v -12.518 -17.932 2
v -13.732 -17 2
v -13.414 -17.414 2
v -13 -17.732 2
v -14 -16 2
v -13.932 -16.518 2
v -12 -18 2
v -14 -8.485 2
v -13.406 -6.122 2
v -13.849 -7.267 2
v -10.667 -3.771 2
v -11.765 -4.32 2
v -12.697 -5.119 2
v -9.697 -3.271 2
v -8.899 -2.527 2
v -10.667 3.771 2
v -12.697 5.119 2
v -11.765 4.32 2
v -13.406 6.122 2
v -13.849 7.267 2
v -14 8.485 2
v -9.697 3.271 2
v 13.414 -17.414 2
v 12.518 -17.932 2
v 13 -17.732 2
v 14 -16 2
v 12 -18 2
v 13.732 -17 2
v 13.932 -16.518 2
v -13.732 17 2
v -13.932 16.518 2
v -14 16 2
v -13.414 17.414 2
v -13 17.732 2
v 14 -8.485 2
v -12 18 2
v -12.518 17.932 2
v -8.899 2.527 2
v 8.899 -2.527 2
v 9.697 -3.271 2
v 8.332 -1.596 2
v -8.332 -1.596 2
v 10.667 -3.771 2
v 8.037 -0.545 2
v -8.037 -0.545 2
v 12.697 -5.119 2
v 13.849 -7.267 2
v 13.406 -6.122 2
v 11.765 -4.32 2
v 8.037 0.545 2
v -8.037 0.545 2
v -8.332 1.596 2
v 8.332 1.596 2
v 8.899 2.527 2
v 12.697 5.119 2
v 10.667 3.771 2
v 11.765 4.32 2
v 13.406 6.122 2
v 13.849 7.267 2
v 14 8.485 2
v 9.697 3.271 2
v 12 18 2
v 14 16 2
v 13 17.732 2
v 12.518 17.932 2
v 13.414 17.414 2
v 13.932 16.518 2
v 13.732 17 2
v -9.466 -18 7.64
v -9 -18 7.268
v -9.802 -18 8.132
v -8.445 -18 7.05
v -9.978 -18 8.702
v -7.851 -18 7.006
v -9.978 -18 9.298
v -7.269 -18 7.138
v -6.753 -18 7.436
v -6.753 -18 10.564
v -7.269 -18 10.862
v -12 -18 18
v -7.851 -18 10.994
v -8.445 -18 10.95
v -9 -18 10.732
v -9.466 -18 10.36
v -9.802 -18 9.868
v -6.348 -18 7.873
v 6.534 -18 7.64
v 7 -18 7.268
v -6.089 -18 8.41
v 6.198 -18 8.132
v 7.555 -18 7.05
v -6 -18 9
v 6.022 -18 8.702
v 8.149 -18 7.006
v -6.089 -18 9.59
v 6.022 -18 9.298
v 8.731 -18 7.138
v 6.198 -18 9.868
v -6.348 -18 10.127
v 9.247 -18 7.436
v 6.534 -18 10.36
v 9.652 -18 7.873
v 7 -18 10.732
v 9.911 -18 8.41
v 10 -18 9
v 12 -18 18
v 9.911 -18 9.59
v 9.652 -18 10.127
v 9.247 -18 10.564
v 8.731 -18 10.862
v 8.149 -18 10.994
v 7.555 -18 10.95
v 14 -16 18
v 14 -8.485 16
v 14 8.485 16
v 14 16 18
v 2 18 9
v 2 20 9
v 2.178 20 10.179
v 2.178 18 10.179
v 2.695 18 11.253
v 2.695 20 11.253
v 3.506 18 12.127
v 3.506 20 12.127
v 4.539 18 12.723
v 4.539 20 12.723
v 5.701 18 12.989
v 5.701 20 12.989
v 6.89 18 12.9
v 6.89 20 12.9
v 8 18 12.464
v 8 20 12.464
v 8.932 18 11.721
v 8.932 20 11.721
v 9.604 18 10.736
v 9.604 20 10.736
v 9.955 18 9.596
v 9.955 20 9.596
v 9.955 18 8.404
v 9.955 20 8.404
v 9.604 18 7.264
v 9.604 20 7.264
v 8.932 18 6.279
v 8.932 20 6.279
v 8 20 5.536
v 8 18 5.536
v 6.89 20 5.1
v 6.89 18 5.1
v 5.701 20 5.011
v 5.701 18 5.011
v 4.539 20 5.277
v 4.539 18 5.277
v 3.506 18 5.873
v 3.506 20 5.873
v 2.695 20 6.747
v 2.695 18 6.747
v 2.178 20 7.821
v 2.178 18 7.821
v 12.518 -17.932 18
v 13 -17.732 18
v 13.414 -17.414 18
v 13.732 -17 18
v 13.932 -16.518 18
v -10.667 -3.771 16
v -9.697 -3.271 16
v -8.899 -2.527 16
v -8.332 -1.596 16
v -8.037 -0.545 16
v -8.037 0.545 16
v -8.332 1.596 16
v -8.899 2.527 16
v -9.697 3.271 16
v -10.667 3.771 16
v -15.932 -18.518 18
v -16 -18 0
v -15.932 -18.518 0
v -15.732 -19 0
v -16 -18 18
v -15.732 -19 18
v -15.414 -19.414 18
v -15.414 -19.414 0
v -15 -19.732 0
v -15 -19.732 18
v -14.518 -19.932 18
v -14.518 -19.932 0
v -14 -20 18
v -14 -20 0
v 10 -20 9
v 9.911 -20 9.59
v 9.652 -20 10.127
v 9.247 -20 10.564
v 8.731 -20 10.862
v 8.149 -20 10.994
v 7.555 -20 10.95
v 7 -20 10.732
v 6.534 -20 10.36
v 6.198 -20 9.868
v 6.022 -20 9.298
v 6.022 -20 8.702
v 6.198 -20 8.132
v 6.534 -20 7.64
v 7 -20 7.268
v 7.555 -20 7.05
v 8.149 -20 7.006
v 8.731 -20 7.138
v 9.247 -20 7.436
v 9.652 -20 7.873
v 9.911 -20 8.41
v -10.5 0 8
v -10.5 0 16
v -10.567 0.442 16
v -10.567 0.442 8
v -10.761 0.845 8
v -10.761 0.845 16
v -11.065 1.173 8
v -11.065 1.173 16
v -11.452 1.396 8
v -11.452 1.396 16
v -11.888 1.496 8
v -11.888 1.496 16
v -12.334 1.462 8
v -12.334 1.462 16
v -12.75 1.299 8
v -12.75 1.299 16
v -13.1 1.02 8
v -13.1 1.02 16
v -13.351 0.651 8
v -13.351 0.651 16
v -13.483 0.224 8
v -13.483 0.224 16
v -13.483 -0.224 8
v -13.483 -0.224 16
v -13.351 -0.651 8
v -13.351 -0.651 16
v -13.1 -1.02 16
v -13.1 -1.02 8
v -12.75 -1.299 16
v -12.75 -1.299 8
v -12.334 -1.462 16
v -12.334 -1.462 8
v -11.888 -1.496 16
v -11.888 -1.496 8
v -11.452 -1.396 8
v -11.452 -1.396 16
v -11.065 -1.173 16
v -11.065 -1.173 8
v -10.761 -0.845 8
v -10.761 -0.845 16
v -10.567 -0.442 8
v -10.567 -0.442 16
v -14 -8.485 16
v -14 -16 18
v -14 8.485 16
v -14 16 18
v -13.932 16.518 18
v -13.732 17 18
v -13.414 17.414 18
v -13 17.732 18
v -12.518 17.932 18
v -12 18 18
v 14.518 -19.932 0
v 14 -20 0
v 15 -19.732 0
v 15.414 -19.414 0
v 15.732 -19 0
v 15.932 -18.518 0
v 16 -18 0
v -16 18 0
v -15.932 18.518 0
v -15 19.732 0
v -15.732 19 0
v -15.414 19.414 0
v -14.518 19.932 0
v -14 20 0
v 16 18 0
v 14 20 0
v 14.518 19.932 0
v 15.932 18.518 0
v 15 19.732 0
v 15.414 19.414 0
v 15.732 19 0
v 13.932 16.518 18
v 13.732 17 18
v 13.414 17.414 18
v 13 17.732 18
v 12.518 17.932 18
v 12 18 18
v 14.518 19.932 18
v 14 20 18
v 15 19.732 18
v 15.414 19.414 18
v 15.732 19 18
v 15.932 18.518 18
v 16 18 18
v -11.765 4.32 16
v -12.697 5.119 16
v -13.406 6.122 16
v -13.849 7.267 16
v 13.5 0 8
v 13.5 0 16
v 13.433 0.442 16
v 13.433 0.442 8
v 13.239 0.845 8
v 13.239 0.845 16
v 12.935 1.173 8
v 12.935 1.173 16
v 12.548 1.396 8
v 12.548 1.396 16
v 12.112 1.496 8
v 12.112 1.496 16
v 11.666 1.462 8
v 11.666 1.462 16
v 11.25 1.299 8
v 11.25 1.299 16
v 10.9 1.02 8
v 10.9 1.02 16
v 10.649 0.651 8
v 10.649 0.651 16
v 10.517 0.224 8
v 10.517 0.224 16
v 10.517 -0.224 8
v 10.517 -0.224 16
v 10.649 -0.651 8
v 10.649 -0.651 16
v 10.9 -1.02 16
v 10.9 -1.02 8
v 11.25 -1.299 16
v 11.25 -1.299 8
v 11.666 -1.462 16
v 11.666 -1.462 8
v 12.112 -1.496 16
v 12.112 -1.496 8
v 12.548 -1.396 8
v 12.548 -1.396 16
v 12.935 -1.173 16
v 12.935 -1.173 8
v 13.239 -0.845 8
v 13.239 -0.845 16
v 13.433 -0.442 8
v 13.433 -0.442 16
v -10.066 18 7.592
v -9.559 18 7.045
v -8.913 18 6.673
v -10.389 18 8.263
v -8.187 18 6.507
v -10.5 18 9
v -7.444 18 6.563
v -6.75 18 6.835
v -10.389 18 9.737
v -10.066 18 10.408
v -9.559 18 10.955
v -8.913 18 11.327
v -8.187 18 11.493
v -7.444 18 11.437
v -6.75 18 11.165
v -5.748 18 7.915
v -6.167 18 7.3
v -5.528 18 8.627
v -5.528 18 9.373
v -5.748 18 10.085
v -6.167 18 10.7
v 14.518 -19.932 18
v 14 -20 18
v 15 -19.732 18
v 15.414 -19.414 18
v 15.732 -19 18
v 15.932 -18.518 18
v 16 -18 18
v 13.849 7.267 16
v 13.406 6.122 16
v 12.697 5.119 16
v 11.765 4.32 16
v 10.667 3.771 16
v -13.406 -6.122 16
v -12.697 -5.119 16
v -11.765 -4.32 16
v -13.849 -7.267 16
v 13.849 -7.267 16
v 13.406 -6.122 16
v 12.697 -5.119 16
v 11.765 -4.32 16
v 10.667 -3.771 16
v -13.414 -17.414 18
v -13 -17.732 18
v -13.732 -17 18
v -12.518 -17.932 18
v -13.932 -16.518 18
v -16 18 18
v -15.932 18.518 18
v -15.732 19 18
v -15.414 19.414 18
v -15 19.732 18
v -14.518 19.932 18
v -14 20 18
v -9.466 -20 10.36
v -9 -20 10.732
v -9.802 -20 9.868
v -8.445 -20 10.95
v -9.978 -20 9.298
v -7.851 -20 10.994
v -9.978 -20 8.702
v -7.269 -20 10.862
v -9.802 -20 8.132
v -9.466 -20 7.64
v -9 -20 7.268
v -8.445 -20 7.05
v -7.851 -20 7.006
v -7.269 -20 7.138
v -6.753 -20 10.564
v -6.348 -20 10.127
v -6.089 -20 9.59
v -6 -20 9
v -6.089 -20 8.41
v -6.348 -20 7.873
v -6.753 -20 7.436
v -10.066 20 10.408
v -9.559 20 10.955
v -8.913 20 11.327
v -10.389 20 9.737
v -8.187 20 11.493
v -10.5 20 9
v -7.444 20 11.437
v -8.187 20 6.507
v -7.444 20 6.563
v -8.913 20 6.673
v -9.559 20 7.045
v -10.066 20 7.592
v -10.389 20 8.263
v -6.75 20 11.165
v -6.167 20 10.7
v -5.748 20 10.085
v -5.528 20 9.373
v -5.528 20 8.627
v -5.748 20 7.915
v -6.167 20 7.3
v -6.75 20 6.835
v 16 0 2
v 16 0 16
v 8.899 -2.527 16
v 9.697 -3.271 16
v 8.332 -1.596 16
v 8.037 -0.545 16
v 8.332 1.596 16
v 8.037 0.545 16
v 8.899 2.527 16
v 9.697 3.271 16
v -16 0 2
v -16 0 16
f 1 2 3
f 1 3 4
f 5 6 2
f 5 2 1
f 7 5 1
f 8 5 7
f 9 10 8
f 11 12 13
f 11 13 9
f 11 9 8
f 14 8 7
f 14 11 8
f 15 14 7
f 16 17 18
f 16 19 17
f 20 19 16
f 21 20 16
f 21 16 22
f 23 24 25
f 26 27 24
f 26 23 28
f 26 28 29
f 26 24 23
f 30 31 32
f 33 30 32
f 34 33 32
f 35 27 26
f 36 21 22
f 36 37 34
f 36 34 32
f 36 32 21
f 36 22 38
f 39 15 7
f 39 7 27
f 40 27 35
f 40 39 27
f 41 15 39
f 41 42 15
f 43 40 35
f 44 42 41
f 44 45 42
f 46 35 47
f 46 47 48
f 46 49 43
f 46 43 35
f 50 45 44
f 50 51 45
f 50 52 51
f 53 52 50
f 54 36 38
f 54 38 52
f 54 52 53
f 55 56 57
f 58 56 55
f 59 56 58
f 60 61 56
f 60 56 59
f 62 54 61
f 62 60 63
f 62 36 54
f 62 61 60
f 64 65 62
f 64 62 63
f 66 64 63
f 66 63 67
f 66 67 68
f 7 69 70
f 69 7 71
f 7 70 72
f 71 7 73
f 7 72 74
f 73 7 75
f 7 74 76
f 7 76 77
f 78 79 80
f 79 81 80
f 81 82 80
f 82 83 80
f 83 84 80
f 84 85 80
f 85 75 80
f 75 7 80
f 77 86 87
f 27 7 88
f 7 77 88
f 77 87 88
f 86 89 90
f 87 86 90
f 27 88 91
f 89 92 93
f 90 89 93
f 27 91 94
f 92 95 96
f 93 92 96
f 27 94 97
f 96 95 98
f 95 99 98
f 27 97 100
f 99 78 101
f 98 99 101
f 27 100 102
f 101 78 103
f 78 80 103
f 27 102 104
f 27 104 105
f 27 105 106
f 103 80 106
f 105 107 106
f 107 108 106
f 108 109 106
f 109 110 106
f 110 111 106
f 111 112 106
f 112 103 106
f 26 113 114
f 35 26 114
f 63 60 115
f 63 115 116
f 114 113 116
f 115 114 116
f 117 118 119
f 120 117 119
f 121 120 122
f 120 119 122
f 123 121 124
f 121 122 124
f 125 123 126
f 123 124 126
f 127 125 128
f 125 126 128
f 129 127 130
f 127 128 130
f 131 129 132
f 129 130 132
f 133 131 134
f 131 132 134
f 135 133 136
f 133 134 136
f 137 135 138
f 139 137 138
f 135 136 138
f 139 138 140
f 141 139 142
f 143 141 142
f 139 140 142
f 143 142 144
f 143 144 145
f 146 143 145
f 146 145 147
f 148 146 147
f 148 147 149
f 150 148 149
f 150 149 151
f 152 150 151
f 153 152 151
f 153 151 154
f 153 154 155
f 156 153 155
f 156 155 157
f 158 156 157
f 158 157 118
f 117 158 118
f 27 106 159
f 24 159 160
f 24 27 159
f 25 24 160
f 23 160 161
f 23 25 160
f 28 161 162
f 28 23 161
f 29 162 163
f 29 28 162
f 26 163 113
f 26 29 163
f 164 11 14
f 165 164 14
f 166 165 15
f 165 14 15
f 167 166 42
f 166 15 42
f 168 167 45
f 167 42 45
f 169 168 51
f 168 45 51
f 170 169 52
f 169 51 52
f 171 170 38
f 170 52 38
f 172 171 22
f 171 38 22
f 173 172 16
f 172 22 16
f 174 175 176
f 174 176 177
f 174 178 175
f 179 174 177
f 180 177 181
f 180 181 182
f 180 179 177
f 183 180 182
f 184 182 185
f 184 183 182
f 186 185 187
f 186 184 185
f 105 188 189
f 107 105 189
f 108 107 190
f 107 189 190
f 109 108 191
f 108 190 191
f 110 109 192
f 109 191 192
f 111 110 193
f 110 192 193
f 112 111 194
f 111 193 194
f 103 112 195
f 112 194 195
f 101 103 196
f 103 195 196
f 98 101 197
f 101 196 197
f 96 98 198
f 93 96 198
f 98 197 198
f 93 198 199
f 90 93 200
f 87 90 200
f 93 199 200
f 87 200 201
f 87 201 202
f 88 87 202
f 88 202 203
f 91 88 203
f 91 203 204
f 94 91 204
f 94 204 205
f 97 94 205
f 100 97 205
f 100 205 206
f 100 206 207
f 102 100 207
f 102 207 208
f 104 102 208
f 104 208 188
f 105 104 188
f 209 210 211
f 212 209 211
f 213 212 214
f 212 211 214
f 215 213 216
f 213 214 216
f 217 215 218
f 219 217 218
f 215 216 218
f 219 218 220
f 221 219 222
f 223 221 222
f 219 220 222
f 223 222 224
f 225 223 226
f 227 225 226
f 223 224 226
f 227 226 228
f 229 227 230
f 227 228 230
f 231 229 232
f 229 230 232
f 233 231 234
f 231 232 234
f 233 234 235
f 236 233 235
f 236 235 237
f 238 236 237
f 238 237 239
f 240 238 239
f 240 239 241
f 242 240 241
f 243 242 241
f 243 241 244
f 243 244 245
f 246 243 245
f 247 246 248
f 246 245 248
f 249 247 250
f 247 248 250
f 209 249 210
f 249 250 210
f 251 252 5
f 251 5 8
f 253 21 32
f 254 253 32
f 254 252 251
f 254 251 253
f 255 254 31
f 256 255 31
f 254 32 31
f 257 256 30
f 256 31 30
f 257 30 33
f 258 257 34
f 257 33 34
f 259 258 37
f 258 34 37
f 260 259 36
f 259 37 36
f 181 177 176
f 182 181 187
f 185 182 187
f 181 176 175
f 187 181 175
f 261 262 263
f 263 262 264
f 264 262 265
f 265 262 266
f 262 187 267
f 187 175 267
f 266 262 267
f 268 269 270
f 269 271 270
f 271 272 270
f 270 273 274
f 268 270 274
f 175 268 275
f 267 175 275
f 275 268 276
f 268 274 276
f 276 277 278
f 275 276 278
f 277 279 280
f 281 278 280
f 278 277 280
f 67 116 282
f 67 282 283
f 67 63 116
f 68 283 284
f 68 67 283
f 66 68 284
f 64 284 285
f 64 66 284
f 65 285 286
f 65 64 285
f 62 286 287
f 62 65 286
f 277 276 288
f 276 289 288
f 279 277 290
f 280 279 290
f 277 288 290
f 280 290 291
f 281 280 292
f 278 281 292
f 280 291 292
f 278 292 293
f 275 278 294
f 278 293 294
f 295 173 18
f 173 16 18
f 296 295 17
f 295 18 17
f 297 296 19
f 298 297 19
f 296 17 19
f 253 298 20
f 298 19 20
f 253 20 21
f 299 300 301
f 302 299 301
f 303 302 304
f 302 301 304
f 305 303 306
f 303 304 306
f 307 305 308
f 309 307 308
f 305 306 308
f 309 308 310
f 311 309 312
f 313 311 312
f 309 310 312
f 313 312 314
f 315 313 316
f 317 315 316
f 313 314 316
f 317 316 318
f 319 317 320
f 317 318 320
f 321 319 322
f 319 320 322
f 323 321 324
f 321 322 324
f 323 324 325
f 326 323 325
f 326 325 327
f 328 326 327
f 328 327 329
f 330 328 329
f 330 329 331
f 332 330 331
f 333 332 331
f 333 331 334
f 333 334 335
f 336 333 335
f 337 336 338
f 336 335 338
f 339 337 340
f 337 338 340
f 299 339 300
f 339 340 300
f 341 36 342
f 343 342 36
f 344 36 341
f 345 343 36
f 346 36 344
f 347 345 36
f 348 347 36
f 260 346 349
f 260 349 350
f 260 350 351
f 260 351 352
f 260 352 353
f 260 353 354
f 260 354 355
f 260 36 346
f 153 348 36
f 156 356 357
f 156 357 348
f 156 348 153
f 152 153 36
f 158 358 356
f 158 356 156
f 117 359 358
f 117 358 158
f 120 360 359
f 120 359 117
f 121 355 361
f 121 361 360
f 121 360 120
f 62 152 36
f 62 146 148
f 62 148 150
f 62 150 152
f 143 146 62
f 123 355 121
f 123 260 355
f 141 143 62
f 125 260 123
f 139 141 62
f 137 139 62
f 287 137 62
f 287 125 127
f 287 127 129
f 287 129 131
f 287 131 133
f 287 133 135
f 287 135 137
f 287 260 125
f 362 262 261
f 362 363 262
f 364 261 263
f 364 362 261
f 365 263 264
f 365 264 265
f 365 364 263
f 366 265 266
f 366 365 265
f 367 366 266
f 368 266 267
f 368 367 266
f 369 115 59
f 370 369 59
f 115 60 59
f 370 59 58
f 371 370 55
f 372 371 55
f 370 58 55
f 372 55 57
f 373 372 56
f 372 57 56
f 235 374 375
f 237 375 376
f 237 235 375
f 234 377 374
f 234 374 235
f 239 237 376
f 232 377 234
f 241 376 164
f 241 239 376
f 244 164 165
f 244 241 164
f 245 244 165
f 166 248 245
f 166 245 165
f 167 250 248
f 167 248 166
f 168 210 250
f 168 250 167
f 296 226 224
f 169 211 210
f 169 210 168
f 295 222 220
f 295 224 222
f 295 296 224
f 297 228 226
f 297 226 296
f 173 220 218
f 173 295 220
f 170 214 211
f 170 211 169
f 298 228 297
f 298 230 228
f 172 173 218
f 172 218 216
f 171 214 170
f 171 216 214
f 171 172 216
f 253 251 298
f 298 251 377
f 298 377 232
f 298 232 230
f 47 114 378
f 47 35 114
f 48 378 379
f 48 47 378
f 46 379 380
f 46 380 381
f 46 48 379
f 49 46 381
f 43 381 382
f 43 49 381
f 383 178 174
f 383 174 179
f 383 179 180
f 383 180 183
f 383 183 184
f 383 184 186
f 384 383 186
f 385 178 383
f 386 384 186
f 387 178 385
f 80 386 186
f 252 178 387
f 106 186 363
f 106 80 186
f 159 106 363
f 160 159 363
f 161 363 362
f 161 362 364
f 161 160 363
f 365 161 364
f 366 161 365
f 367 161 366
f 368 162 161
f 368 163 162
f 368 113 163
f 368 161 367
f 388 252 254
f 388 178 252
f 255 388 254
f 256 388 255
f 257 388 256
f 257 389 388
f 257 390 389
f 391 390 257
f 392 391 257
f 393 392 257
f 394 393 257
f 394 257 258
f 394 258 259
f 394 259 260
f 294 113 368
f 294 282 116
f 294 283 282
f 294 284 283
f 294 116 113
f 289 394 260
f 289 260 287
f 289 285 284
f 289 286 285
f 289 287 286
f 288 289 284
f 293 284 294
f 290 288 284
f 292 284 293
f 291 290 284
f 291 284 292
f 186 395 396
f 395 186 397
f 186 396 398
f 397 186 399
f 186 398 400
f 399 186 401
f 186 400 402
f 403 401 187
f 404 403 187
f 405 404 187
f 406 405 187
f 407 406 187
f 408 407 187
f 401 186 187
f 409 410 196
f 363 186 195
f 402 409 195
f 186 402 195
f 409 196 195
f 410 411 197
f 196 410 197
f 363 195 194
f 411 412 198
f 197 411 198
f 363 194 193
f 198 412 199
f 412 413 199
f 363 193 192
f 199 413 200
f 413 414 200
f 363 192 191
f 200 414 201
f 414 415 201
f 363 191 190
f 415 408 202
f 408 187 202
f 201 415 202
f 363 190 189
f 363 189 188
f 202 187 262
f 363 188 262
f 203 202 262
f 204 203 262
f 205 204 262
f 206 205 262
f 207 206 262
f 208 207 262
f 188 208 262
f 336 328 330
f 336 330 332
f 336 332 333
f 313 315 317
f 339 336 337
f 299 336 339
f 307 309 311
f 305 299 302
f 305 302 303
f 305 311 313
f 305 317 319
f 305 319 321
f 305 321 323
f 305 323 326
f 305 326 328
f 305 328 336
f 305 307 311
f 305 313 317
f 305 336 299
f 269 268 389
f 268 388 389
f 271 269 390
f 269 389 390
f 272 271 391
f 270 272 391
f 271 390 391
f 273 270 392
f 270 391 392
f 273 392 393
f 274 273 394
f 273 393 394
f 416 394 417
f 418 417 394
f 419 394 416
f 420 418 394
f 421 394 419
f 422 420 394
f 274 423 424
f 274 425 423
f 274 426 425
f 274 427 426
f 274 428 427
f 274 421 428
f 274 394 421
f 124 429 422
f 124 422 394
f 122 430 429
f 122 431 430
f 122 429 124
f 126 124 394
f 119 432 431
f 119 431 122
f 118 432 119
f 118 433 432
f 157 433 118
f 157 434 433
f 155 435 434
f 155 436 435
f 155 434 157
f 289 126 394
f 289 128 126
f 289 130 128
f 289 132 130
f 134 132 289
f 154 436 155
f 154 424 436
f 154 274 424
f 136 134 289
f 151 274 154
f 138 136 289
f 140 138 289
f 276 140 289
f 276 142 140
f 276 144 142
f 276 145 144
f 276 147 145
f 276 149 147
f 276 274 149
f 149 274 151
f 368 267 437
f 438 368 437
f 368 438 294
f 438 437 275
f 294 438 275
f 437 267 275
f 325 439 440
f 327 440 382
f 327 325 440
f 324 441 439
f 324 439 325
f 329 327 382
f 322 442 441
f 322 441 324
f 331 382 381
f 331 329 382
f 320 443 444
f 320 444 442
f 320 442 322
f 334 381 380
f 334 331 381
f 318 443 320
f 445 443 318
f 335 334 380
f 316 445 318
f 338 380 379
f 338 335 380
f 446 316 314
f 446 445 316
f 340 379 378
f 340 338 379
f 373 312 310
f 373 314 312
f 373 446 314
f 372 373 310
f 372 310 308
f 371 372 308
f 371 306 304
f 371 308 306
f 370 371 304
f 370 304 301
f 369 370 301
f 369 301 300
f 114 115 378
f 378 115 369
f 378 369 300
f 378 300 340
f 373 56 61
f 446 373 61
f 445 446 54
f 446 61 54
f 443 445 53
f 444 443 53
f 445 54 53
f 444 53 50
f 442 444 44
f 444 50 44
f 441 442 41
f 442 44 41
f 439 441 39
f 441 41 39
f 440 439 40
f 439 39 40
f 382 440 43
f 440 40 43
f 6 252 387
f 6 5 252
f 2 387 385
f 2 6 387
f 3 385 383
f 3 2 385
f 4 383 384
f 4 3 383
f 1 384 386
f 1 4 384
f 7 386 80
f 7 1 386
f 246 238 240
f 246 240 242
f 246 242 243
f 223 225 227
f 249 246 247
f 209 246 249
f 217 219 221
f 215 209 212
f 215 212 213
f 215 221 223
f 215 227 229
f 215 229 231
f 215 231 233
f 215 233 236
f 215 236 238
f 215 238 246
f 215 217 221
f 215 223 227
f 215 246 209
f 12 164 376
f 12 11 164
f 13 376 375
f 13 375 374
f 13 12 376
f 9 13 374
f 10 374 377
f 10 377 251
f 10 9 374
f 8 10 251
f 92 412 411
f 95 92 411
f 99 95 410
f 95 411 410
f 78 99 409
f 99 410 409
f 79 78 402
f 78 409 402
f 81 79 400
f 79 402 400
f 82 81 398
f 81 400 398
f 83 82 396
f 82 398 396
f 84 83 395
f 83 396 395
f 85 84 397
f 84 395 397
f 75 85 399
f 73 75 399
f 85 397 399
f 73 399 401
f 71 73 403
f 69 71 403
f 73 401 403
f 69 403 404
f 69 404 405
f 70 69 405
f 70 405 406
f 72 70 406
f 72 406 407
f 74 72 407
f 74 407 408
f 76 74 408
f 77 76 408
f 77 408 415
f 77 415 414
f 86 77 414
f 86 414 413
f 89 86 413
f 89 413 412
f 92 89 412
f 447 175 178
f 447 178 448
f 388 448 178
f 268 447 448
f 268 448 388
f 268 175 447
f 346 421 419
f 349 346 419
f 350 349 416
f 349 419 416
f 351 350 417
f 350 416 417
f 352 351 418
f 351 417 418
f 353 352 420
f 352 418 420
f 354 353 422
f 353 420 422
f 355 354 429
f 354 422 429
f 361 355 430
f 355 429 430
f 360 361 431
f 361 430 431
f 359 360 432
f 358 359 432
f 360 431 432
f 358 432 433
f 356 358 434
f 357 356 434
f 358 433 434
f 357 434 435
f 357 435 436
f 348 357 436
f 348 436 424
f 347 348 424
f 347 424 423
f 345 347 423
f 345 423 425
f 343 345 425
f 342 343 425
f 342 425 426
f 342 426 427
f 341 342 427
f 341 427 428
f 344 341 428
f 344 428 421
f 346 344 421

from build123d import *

# Parameters (mm, degrees)
F0_W      = 32
F0_H      = 40
F1_DEPTH  = 18
F2_W      = 28
F2_H      = 36
F3_DEPTH  = 16
F4_R      = 4
F4_R_2    = 2.5
F5_DEPTH  = 3
F6_R      = 2
F7_DEPTH  = 3
F8_R      = 4
F9_DEPTH  = 14
F10_R     = 1.5
F11_DEPTH = 8
F12_R     = 5
F13_R     = 2
F14_R     = 2


with BuildPart() as f1:
    # F0 (on Top) → F1 (new body)
    with BuildSketch(Plane.XY):
        Rectangle(F0_W, F0_H)
    extrude(amount=F1_DEPTH)

    # F2 (on face) → F3 (cut)
    with BuildSketch(Plane.XY.offset(18)):
        Rectangle(F2_W, F2_H)
    extrude(amount=-F3_DEPTH, mode=Mode.SUBTRACT)

    # F4 (on face) → F5 (cut)
    with BuildSketch(Plane(origin=(0, 20, 0), x_dir=(-1, 0, 0), z_dir=(0, 1, 0))):
        with Locations((-6, 9)):
            Circle(F4_R)
        with Locations((8, 9)):
            Circle(F4_R_2)
    extrude(amount=-F5_DEPTH, mode=Mode.SUBTRACT)

    # F6 (on face) → F7 (cut)
    with BuildSketch(Plane.XZ.offset(20)):
        with Locations((-8, 9)):
            Circle(F6_R)
        with Locations((8, 9)):
            Circle(F6_R)
    extrude(amount=-F7_DEPTH, mode=Mode.SUBTRACT)

    # F8 (on face) → F9 (join)
    with BuildSketch(Plane.XY.offset(2)):
        with Locations((-12, 0)):
            Circle(F8_R)
        with Locations((12, 0)):
            Circle(F8_R)
    extrude(amount=F9_DEPTH)

    # F10 (on face) → F11 (cut)
    with BuildSketch(Plane.XY.offset(16)):
        with Locations((-12, 0)):
            Circle(F10_R)
        with Locations((12, 0)):
            Circle(F10_R)
    extrude(amount=-F11_DEPTH, mode=Mode.SUBTRACT)

    # F12
    f12_edges = [f1.edges().sort_by_distance(p)[0] for p in [
        (14, 3.464102, 9),
        (14, -3.464102, 9),
        (-14, -3.464102, 9),
        (-14, 3.464102, 9),
    ]]
    fillet(f12_edges, radius=F12_R)

    # F13
    f13_edges = [f1.edges().sort_by_distance(p)[0] for p in [
        (-14, -18, 10),
        (14, -18, 10),
        (14, 18, 10),
        (-14, 18, 10),
    ]]
    fillet(f13_edges, radius=F13_R)

    # F14
    f14_edges = [f1.edges().sort_by_distance(p)[0] for p in [
        (16, 20, 9),
        (16, -20, 9),
        (-16, -20, 9),
        (-16, 20, 9),
    ]]
    fillet(f14_edges, radius=F14_R)


solid = f1.part
